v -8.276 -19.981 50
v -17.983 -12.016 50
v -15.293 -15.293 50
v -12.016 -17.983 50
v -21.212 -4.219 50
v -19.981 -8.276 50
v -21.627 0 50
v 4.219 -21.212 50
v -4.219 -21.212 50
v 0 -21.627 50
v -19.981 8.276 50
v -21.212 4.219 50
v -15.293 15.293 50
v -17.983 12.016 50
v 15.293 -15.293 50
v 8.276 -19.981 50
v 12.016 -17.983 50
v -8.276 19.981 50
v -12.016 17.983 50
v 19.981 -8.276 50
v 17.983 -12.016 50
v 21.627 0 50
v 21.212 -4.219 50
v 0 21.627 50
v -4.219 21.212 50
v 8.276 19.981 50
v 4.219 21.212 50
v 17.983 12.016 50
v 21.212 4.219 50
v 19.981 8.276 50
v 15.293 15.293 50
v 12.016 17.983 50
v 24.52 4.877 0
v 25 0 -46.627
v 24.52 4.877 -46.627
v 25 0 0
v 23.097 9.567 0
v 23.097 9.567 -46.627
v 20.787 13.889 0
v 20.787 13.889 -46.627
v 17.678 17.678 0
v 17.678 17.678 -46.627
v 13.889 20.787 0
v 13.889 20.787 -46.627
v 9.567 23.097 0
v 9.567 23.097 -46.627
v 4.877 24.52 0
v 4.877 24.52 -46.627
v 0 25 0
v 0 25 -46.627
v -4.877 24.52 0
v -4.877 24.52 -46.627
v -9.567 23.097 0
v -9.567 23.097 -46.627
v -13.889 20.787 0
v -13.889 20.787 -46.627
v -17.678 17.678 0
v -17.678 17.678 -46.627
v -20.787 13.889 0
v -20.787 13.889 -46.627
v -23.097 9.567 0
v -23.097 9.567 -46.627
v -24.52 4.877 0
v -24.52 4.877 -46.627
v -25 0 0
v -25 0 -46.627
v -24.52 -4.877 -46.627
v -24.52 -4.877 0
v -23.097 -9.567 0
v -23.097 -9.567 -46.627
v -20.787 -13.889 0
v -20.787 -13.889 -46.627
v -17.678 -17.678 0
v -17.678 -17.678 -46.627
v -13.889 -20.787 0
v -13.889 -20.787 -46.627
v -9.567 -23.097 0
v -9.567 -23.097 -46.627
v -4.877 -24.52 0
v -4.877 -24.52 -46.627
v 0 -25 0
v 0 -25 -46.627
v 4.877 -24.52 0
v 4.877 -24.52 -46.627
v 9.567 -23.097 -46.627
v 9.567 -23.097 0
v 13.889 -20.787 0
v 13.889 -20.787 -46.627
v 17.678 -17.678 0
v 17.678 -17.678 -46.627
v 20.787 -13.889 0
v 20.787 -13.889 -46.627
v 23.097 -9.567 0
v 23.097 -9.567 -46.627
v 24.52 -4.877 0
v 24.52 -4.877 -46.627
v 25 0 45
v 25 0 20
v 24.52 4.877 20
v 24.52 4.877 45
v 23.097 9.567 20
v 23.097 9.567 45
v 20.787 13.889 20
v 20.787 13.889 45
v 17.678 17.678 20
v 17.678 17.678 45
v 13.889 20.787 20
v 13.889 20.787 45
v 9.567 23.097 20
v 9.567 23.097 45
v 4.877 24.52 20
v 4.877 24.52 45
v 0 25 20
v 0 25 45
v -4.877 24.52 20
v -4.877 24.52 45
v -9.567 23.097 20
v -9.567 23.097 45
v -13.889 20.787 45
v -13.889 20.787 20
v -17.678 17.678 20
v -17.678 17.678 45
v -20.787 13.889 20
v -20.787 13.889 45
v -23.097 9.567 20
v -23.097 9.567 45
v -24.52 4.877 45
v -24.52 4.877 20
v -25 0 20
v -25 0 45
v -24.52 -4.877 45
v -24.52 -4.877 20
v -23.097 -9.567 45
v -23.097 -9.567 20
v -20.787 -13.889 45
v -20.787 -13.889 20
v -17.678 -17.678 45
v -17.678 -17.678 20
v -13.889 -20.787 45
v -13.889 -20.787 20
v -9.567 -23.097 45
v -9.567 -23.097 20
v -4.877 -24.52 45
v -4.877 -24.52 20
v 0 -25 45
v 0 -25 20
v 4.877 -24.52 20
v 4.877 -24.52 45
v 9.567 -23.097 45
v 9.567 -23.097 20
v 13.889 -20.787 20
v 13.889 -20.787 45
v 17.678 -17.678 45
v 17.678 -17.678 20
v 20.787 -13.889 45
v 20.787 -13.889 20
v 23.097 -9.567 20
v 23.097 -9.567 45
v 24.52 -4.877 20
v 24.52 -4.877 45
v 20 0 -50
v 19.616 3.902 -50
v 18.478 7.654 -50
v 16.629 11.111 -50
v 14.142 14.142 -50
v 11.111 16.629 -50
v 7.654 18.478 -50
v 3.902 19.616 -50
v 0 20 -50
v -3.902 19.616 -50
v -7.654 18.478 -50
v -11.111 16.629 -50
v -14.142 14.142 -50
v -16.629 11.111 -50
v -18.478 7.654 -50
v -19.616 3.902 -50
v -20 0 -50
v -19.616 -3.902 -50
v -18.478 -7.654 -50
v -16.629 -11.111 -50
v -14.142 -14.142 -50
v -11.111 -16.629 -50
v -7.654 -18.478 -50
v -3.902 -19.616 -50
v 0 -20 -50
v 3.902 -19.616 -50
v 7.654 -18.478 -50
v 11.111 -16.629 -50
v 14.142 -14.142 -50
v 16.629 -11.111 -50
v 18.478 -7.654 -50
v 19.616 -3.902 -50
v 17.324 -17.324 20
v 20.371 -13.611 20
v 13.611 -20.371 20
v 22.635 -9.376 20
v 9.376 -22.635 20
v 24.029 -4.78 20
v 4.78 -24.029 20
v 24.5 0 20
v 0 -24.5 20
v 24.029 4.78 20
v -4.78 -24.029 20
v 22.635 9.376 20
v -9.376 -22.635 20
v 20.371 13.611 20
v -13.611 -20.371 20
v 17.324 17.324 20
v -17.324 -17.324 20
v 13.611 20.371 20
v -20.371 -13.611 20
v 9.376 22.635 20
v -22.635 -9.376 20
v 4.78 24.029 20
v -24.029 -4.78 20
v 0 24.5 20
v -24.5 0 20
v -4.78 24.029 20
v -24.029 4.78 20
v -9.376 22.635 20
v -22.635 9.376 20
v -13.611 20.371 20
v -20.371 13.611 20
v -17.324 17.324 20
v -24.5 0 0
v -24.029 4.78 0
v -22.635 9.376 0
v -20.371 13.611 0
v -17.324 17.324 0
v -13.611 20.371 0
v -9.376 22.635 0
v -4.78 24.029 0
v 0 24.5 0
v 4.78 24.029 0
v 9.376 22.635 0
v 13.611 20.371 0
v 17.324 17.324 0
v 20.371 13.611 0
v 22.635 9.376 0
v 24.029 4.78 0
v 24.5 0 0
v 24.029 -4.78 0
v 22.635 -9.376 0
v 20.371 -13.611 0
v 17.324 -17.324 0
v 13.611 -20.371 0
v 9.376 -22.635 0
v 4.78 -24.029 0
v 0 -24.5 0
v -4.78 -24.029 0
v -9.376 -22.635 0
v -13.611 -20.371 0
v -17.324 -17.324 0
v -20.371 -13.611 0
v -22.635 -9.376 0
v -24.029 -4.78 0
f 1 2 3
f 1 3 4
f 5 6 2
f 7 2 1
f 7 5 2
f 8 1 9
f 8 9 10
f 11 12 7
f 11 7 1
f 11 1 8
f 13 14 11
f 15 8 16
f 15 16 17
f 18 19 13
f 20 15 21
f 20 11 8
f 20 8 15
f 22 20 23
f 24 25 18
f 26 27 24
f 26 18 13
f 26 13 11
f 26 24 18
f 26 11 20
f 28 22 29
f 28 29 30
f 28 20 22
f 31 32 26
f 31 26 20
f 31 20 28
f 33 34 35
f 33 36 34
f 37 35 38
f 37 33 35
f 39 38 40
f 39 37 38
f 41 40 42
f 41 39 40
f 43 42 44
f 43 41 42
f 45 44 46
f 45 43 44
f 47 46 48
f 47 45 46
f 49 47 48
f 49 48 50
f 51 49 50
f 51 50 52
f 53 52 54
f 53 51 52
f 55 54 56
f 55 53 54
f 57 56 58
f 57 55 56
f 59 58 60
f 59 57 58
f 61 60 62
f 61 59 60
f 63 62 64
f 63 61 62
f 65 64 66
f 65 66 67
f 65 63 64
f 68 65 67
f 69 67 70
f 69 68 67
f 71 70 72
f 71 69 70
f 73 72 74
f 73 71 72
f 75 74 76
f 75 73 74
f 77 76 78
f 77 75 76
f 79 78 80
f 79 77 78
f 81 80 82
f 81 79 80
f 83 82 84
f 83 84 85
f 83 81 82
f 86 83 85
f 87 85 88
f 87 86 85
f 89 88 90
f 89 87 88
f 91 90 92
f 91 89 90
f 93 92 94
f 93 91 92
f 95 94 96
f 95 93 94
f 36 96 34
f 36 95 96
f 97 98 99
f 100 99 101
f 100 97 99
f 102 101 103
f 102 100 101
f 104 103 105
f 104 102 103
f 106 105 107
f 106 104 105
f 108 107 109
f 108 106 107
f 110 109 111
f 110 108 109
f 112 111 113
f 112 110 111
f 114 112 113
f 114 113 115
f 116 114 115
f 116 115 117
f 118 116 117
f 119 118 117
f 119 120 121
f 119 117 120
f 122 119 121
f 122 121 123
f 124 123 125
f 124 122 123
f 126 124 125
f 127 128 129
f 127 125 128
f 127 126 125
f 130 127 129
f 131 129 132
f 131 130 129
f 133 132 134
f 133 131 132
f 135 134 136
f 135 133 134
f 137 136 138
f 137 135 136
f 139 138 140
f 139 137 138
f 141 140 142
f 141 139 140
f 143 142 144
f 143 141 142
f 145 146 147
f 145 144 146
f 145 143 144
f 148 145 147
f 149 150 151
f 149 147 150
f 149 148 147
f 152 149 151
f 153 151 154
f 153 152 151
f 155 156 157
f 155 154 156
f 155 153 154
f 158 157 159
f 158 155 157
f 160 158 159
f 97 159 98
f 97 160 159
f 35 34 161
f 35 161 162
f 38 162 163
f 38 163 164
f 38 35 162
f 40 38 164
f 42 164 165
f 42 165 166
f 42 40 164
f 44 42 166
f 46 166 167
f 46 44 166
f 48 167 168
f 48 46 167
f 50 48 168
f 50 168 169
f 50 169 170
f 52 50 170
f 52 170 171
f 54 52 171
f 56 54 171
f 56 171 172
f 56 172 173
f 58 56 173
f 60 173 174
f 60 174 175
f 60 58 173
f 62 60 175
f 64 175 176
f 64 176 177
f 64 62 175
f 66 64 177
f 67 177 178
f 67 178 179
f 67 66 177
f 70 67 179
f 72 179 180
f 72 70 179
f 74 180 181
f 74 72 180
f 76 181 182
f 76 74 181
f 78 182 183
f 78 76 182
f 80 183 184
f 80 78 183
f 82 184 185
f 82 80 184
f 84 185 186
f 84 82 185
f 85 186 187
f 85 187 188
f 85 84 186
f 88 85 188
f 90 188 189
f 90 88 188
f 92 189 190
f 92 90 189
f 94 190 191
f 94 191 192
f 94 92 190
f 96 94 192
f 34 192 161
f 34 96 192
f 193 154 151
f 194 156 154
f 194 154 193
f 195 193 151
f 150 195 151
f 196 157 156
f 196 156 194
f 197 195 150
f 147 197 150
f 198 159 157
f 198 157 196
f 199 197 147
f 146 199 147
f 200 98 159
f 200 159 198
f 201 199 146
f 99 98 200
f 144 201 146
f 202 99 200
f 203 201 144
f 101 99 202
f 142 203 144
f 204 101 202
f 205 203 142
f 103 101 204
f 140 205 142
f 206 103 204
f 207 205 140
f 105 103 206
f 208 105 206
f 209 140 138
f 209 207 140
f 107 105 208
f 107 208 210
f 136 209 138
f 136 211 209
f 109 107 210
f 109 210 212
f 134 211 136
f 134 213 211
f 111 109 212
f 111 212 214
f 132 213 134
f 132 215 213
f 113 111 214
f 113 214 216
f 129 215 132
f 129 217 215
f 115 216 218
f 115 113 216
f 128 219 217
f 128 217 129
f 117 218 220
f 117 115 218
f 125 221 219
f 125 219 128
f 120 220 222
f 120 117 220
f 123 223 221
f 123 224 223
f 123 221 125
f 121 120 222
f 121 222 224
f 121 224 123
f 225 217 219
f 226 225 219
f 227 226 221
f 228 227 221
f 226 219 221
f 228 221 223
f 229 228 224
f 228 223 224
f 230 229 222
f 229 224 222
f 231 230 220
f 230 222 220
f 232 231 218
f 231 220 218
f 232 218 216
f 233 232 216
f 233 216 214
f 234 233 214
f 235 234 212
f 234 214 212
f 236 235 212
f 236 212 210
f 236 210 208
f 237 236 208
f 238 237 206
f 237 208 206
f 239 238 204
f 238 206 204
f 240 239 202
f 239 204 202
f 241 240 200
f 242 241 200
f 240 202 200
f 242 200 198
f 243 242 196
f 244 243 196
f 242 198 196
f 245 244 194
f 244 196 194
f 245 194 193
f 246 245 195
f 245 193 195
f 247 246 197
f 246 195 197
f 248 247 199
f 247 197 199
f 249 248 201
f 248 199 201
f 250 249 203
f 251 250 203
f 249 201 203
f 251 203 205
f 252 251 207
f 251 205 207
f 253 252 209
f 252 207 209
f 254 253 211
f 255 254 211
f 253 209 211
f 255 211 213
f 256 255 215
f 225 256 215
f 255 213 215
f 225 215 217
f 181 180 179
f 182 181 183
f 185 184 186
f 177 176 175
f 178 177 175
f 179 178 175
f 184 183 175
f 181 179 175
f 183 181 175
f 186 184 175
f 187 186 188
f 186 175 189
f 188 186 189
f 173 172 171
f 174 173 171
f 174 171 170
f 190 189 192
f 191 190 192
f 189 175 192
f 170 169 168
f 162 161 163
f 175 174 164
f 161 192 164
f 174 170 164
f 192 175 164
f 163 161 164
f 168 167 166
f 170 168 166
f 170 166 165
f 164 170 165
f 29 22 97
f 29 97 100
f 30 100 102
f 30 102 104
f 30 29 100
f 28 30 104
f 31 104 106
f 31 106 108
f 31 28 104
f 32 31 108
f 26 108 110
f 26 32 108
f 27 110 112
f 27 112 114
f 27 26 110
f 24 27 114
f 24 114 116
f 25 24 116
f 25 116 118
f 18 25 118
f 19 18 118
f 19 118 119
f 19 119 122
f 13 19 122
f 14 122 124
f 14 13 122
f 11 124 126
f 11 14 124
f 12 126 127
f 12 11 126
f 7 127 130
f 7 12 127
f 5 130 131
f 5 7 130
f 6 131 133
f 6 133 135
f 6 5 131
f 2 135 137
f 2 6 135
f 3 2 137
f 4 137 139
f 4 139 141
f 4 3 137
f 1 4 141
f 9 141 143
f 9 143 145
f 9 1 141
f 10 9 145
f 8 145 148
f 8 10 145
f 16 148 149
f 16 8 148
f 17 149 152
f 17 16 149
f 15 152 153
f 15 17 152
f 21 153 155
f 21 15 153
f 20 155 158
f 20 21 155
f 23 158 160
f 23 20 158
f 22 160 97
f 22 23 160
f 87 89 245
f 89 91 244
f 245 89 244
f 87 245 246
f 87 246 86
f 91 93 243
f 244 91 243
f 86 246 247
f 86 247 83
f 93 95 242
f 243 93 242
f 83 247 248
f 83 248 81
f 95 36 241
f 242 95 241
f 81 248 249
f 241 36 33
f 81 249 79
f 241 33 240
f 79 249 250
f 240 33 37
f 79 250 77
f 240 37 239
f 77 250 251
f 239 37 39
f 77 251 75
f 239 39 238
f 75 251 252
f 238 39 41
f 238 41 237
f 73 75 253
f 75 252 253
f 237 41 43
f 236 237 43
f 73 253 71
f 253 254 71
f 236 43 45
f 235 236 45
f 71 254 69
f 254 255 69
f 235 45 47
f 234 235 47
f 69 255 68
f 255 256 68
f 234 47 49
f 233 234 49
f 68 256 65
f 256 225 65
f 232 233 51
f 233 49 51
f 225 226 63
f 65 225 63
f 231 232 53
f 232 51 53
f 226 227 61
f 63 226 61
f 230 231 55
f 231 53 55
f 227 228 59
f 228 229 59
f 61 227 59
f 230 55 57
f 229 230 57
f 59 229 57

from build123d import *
from OCP.BRepFilletAPI import BRepFilletAPI_MakeChamfer

# Parameters (mm, degrees)
SKETCH_1_R          = 25
EXTRUDE_1_DEPTH     = 50
CHAMFER_1_SIZE      = 5
CHAMFER_1_SIZE2     = 3.372542584
CUT_EXTRUDE_START   = -20
SKETCH_2_R          = 25
SKETCH_2_R_2        = 24.5
CUT_EXTRUDE_1_DEPTH = 20


with BuildPart() as part:
    # 草图1 → 凸台-拉伸1 (new, symmetric)
    with BuildSketch(Plane.XY):
        Circle(SKETCH_1_R)
    extrude(amount=EXTRUDE_1_DEPTH, both=True)

    # 倒角1: one chamfer whose edges measure the first distance from different faces: ONE call of the kernel's chamfer builder (chamfer() names one face for all edges)
    chamfer_1_edges_1 = [part.edges().sort_by_distance(p)[0] for p in [
        (-25, 0, -50),
    ]]
    chamfer_1_side_1 = [part.faces().sort_by_distance(p)[0] for p in [
        (0, 0, -50),
    ]]
    chamfer_1_edges_2 = [part.edges().sort_by_distance(p)[0] for p in [
        (-25, 0, 50),
    ]]
    chamfer_1_side_2 = [part.faces().sort_by_distance(p)[0] for p in [
        (-25, 0, 0),
    ]]
    chamfer_1 = BRepFilletAPI_MakeChamfer(part.part.solid().wrapped)
    for e in chamfer_1_edges_1:
        chamfer_1.Add(CHAMFER_1_SIZE, CHAMFER_1_SIZE2, e.wrapped, chamfer_1_side_1[0].wrapped)  # the first distance lies on this face
    for e in chamfer_1_edges_2:
        chamfer_1.Add(CHAMFER_1_SIZE, CHAMFER_1_SIZE2, e.wrapped, chamfer_1_side_2[0].wrapped)  # the first distance lies on this face
    add(Compound.cast(chamfer_1.Shape()), mode=Mode.REPLACE)

    # 草图2 → 切除-拉伸1 (cut)
    with BuildSketch(Plane(origin=(0, 0, 0), x_dir=(-1, 0, 0), z_dir=(0, 0, -1)).offset(CUT_EXTRUDE_START)):
        Circle(SKETCH_2_R)
        Circle(SKETCH_2_R_2, mode=Mode.SUBTRACT)
    extrude(amount=CUT_EXTRUDE_1_DEPTH, mode=Mode.SUBTRACT)


solid = part.part
